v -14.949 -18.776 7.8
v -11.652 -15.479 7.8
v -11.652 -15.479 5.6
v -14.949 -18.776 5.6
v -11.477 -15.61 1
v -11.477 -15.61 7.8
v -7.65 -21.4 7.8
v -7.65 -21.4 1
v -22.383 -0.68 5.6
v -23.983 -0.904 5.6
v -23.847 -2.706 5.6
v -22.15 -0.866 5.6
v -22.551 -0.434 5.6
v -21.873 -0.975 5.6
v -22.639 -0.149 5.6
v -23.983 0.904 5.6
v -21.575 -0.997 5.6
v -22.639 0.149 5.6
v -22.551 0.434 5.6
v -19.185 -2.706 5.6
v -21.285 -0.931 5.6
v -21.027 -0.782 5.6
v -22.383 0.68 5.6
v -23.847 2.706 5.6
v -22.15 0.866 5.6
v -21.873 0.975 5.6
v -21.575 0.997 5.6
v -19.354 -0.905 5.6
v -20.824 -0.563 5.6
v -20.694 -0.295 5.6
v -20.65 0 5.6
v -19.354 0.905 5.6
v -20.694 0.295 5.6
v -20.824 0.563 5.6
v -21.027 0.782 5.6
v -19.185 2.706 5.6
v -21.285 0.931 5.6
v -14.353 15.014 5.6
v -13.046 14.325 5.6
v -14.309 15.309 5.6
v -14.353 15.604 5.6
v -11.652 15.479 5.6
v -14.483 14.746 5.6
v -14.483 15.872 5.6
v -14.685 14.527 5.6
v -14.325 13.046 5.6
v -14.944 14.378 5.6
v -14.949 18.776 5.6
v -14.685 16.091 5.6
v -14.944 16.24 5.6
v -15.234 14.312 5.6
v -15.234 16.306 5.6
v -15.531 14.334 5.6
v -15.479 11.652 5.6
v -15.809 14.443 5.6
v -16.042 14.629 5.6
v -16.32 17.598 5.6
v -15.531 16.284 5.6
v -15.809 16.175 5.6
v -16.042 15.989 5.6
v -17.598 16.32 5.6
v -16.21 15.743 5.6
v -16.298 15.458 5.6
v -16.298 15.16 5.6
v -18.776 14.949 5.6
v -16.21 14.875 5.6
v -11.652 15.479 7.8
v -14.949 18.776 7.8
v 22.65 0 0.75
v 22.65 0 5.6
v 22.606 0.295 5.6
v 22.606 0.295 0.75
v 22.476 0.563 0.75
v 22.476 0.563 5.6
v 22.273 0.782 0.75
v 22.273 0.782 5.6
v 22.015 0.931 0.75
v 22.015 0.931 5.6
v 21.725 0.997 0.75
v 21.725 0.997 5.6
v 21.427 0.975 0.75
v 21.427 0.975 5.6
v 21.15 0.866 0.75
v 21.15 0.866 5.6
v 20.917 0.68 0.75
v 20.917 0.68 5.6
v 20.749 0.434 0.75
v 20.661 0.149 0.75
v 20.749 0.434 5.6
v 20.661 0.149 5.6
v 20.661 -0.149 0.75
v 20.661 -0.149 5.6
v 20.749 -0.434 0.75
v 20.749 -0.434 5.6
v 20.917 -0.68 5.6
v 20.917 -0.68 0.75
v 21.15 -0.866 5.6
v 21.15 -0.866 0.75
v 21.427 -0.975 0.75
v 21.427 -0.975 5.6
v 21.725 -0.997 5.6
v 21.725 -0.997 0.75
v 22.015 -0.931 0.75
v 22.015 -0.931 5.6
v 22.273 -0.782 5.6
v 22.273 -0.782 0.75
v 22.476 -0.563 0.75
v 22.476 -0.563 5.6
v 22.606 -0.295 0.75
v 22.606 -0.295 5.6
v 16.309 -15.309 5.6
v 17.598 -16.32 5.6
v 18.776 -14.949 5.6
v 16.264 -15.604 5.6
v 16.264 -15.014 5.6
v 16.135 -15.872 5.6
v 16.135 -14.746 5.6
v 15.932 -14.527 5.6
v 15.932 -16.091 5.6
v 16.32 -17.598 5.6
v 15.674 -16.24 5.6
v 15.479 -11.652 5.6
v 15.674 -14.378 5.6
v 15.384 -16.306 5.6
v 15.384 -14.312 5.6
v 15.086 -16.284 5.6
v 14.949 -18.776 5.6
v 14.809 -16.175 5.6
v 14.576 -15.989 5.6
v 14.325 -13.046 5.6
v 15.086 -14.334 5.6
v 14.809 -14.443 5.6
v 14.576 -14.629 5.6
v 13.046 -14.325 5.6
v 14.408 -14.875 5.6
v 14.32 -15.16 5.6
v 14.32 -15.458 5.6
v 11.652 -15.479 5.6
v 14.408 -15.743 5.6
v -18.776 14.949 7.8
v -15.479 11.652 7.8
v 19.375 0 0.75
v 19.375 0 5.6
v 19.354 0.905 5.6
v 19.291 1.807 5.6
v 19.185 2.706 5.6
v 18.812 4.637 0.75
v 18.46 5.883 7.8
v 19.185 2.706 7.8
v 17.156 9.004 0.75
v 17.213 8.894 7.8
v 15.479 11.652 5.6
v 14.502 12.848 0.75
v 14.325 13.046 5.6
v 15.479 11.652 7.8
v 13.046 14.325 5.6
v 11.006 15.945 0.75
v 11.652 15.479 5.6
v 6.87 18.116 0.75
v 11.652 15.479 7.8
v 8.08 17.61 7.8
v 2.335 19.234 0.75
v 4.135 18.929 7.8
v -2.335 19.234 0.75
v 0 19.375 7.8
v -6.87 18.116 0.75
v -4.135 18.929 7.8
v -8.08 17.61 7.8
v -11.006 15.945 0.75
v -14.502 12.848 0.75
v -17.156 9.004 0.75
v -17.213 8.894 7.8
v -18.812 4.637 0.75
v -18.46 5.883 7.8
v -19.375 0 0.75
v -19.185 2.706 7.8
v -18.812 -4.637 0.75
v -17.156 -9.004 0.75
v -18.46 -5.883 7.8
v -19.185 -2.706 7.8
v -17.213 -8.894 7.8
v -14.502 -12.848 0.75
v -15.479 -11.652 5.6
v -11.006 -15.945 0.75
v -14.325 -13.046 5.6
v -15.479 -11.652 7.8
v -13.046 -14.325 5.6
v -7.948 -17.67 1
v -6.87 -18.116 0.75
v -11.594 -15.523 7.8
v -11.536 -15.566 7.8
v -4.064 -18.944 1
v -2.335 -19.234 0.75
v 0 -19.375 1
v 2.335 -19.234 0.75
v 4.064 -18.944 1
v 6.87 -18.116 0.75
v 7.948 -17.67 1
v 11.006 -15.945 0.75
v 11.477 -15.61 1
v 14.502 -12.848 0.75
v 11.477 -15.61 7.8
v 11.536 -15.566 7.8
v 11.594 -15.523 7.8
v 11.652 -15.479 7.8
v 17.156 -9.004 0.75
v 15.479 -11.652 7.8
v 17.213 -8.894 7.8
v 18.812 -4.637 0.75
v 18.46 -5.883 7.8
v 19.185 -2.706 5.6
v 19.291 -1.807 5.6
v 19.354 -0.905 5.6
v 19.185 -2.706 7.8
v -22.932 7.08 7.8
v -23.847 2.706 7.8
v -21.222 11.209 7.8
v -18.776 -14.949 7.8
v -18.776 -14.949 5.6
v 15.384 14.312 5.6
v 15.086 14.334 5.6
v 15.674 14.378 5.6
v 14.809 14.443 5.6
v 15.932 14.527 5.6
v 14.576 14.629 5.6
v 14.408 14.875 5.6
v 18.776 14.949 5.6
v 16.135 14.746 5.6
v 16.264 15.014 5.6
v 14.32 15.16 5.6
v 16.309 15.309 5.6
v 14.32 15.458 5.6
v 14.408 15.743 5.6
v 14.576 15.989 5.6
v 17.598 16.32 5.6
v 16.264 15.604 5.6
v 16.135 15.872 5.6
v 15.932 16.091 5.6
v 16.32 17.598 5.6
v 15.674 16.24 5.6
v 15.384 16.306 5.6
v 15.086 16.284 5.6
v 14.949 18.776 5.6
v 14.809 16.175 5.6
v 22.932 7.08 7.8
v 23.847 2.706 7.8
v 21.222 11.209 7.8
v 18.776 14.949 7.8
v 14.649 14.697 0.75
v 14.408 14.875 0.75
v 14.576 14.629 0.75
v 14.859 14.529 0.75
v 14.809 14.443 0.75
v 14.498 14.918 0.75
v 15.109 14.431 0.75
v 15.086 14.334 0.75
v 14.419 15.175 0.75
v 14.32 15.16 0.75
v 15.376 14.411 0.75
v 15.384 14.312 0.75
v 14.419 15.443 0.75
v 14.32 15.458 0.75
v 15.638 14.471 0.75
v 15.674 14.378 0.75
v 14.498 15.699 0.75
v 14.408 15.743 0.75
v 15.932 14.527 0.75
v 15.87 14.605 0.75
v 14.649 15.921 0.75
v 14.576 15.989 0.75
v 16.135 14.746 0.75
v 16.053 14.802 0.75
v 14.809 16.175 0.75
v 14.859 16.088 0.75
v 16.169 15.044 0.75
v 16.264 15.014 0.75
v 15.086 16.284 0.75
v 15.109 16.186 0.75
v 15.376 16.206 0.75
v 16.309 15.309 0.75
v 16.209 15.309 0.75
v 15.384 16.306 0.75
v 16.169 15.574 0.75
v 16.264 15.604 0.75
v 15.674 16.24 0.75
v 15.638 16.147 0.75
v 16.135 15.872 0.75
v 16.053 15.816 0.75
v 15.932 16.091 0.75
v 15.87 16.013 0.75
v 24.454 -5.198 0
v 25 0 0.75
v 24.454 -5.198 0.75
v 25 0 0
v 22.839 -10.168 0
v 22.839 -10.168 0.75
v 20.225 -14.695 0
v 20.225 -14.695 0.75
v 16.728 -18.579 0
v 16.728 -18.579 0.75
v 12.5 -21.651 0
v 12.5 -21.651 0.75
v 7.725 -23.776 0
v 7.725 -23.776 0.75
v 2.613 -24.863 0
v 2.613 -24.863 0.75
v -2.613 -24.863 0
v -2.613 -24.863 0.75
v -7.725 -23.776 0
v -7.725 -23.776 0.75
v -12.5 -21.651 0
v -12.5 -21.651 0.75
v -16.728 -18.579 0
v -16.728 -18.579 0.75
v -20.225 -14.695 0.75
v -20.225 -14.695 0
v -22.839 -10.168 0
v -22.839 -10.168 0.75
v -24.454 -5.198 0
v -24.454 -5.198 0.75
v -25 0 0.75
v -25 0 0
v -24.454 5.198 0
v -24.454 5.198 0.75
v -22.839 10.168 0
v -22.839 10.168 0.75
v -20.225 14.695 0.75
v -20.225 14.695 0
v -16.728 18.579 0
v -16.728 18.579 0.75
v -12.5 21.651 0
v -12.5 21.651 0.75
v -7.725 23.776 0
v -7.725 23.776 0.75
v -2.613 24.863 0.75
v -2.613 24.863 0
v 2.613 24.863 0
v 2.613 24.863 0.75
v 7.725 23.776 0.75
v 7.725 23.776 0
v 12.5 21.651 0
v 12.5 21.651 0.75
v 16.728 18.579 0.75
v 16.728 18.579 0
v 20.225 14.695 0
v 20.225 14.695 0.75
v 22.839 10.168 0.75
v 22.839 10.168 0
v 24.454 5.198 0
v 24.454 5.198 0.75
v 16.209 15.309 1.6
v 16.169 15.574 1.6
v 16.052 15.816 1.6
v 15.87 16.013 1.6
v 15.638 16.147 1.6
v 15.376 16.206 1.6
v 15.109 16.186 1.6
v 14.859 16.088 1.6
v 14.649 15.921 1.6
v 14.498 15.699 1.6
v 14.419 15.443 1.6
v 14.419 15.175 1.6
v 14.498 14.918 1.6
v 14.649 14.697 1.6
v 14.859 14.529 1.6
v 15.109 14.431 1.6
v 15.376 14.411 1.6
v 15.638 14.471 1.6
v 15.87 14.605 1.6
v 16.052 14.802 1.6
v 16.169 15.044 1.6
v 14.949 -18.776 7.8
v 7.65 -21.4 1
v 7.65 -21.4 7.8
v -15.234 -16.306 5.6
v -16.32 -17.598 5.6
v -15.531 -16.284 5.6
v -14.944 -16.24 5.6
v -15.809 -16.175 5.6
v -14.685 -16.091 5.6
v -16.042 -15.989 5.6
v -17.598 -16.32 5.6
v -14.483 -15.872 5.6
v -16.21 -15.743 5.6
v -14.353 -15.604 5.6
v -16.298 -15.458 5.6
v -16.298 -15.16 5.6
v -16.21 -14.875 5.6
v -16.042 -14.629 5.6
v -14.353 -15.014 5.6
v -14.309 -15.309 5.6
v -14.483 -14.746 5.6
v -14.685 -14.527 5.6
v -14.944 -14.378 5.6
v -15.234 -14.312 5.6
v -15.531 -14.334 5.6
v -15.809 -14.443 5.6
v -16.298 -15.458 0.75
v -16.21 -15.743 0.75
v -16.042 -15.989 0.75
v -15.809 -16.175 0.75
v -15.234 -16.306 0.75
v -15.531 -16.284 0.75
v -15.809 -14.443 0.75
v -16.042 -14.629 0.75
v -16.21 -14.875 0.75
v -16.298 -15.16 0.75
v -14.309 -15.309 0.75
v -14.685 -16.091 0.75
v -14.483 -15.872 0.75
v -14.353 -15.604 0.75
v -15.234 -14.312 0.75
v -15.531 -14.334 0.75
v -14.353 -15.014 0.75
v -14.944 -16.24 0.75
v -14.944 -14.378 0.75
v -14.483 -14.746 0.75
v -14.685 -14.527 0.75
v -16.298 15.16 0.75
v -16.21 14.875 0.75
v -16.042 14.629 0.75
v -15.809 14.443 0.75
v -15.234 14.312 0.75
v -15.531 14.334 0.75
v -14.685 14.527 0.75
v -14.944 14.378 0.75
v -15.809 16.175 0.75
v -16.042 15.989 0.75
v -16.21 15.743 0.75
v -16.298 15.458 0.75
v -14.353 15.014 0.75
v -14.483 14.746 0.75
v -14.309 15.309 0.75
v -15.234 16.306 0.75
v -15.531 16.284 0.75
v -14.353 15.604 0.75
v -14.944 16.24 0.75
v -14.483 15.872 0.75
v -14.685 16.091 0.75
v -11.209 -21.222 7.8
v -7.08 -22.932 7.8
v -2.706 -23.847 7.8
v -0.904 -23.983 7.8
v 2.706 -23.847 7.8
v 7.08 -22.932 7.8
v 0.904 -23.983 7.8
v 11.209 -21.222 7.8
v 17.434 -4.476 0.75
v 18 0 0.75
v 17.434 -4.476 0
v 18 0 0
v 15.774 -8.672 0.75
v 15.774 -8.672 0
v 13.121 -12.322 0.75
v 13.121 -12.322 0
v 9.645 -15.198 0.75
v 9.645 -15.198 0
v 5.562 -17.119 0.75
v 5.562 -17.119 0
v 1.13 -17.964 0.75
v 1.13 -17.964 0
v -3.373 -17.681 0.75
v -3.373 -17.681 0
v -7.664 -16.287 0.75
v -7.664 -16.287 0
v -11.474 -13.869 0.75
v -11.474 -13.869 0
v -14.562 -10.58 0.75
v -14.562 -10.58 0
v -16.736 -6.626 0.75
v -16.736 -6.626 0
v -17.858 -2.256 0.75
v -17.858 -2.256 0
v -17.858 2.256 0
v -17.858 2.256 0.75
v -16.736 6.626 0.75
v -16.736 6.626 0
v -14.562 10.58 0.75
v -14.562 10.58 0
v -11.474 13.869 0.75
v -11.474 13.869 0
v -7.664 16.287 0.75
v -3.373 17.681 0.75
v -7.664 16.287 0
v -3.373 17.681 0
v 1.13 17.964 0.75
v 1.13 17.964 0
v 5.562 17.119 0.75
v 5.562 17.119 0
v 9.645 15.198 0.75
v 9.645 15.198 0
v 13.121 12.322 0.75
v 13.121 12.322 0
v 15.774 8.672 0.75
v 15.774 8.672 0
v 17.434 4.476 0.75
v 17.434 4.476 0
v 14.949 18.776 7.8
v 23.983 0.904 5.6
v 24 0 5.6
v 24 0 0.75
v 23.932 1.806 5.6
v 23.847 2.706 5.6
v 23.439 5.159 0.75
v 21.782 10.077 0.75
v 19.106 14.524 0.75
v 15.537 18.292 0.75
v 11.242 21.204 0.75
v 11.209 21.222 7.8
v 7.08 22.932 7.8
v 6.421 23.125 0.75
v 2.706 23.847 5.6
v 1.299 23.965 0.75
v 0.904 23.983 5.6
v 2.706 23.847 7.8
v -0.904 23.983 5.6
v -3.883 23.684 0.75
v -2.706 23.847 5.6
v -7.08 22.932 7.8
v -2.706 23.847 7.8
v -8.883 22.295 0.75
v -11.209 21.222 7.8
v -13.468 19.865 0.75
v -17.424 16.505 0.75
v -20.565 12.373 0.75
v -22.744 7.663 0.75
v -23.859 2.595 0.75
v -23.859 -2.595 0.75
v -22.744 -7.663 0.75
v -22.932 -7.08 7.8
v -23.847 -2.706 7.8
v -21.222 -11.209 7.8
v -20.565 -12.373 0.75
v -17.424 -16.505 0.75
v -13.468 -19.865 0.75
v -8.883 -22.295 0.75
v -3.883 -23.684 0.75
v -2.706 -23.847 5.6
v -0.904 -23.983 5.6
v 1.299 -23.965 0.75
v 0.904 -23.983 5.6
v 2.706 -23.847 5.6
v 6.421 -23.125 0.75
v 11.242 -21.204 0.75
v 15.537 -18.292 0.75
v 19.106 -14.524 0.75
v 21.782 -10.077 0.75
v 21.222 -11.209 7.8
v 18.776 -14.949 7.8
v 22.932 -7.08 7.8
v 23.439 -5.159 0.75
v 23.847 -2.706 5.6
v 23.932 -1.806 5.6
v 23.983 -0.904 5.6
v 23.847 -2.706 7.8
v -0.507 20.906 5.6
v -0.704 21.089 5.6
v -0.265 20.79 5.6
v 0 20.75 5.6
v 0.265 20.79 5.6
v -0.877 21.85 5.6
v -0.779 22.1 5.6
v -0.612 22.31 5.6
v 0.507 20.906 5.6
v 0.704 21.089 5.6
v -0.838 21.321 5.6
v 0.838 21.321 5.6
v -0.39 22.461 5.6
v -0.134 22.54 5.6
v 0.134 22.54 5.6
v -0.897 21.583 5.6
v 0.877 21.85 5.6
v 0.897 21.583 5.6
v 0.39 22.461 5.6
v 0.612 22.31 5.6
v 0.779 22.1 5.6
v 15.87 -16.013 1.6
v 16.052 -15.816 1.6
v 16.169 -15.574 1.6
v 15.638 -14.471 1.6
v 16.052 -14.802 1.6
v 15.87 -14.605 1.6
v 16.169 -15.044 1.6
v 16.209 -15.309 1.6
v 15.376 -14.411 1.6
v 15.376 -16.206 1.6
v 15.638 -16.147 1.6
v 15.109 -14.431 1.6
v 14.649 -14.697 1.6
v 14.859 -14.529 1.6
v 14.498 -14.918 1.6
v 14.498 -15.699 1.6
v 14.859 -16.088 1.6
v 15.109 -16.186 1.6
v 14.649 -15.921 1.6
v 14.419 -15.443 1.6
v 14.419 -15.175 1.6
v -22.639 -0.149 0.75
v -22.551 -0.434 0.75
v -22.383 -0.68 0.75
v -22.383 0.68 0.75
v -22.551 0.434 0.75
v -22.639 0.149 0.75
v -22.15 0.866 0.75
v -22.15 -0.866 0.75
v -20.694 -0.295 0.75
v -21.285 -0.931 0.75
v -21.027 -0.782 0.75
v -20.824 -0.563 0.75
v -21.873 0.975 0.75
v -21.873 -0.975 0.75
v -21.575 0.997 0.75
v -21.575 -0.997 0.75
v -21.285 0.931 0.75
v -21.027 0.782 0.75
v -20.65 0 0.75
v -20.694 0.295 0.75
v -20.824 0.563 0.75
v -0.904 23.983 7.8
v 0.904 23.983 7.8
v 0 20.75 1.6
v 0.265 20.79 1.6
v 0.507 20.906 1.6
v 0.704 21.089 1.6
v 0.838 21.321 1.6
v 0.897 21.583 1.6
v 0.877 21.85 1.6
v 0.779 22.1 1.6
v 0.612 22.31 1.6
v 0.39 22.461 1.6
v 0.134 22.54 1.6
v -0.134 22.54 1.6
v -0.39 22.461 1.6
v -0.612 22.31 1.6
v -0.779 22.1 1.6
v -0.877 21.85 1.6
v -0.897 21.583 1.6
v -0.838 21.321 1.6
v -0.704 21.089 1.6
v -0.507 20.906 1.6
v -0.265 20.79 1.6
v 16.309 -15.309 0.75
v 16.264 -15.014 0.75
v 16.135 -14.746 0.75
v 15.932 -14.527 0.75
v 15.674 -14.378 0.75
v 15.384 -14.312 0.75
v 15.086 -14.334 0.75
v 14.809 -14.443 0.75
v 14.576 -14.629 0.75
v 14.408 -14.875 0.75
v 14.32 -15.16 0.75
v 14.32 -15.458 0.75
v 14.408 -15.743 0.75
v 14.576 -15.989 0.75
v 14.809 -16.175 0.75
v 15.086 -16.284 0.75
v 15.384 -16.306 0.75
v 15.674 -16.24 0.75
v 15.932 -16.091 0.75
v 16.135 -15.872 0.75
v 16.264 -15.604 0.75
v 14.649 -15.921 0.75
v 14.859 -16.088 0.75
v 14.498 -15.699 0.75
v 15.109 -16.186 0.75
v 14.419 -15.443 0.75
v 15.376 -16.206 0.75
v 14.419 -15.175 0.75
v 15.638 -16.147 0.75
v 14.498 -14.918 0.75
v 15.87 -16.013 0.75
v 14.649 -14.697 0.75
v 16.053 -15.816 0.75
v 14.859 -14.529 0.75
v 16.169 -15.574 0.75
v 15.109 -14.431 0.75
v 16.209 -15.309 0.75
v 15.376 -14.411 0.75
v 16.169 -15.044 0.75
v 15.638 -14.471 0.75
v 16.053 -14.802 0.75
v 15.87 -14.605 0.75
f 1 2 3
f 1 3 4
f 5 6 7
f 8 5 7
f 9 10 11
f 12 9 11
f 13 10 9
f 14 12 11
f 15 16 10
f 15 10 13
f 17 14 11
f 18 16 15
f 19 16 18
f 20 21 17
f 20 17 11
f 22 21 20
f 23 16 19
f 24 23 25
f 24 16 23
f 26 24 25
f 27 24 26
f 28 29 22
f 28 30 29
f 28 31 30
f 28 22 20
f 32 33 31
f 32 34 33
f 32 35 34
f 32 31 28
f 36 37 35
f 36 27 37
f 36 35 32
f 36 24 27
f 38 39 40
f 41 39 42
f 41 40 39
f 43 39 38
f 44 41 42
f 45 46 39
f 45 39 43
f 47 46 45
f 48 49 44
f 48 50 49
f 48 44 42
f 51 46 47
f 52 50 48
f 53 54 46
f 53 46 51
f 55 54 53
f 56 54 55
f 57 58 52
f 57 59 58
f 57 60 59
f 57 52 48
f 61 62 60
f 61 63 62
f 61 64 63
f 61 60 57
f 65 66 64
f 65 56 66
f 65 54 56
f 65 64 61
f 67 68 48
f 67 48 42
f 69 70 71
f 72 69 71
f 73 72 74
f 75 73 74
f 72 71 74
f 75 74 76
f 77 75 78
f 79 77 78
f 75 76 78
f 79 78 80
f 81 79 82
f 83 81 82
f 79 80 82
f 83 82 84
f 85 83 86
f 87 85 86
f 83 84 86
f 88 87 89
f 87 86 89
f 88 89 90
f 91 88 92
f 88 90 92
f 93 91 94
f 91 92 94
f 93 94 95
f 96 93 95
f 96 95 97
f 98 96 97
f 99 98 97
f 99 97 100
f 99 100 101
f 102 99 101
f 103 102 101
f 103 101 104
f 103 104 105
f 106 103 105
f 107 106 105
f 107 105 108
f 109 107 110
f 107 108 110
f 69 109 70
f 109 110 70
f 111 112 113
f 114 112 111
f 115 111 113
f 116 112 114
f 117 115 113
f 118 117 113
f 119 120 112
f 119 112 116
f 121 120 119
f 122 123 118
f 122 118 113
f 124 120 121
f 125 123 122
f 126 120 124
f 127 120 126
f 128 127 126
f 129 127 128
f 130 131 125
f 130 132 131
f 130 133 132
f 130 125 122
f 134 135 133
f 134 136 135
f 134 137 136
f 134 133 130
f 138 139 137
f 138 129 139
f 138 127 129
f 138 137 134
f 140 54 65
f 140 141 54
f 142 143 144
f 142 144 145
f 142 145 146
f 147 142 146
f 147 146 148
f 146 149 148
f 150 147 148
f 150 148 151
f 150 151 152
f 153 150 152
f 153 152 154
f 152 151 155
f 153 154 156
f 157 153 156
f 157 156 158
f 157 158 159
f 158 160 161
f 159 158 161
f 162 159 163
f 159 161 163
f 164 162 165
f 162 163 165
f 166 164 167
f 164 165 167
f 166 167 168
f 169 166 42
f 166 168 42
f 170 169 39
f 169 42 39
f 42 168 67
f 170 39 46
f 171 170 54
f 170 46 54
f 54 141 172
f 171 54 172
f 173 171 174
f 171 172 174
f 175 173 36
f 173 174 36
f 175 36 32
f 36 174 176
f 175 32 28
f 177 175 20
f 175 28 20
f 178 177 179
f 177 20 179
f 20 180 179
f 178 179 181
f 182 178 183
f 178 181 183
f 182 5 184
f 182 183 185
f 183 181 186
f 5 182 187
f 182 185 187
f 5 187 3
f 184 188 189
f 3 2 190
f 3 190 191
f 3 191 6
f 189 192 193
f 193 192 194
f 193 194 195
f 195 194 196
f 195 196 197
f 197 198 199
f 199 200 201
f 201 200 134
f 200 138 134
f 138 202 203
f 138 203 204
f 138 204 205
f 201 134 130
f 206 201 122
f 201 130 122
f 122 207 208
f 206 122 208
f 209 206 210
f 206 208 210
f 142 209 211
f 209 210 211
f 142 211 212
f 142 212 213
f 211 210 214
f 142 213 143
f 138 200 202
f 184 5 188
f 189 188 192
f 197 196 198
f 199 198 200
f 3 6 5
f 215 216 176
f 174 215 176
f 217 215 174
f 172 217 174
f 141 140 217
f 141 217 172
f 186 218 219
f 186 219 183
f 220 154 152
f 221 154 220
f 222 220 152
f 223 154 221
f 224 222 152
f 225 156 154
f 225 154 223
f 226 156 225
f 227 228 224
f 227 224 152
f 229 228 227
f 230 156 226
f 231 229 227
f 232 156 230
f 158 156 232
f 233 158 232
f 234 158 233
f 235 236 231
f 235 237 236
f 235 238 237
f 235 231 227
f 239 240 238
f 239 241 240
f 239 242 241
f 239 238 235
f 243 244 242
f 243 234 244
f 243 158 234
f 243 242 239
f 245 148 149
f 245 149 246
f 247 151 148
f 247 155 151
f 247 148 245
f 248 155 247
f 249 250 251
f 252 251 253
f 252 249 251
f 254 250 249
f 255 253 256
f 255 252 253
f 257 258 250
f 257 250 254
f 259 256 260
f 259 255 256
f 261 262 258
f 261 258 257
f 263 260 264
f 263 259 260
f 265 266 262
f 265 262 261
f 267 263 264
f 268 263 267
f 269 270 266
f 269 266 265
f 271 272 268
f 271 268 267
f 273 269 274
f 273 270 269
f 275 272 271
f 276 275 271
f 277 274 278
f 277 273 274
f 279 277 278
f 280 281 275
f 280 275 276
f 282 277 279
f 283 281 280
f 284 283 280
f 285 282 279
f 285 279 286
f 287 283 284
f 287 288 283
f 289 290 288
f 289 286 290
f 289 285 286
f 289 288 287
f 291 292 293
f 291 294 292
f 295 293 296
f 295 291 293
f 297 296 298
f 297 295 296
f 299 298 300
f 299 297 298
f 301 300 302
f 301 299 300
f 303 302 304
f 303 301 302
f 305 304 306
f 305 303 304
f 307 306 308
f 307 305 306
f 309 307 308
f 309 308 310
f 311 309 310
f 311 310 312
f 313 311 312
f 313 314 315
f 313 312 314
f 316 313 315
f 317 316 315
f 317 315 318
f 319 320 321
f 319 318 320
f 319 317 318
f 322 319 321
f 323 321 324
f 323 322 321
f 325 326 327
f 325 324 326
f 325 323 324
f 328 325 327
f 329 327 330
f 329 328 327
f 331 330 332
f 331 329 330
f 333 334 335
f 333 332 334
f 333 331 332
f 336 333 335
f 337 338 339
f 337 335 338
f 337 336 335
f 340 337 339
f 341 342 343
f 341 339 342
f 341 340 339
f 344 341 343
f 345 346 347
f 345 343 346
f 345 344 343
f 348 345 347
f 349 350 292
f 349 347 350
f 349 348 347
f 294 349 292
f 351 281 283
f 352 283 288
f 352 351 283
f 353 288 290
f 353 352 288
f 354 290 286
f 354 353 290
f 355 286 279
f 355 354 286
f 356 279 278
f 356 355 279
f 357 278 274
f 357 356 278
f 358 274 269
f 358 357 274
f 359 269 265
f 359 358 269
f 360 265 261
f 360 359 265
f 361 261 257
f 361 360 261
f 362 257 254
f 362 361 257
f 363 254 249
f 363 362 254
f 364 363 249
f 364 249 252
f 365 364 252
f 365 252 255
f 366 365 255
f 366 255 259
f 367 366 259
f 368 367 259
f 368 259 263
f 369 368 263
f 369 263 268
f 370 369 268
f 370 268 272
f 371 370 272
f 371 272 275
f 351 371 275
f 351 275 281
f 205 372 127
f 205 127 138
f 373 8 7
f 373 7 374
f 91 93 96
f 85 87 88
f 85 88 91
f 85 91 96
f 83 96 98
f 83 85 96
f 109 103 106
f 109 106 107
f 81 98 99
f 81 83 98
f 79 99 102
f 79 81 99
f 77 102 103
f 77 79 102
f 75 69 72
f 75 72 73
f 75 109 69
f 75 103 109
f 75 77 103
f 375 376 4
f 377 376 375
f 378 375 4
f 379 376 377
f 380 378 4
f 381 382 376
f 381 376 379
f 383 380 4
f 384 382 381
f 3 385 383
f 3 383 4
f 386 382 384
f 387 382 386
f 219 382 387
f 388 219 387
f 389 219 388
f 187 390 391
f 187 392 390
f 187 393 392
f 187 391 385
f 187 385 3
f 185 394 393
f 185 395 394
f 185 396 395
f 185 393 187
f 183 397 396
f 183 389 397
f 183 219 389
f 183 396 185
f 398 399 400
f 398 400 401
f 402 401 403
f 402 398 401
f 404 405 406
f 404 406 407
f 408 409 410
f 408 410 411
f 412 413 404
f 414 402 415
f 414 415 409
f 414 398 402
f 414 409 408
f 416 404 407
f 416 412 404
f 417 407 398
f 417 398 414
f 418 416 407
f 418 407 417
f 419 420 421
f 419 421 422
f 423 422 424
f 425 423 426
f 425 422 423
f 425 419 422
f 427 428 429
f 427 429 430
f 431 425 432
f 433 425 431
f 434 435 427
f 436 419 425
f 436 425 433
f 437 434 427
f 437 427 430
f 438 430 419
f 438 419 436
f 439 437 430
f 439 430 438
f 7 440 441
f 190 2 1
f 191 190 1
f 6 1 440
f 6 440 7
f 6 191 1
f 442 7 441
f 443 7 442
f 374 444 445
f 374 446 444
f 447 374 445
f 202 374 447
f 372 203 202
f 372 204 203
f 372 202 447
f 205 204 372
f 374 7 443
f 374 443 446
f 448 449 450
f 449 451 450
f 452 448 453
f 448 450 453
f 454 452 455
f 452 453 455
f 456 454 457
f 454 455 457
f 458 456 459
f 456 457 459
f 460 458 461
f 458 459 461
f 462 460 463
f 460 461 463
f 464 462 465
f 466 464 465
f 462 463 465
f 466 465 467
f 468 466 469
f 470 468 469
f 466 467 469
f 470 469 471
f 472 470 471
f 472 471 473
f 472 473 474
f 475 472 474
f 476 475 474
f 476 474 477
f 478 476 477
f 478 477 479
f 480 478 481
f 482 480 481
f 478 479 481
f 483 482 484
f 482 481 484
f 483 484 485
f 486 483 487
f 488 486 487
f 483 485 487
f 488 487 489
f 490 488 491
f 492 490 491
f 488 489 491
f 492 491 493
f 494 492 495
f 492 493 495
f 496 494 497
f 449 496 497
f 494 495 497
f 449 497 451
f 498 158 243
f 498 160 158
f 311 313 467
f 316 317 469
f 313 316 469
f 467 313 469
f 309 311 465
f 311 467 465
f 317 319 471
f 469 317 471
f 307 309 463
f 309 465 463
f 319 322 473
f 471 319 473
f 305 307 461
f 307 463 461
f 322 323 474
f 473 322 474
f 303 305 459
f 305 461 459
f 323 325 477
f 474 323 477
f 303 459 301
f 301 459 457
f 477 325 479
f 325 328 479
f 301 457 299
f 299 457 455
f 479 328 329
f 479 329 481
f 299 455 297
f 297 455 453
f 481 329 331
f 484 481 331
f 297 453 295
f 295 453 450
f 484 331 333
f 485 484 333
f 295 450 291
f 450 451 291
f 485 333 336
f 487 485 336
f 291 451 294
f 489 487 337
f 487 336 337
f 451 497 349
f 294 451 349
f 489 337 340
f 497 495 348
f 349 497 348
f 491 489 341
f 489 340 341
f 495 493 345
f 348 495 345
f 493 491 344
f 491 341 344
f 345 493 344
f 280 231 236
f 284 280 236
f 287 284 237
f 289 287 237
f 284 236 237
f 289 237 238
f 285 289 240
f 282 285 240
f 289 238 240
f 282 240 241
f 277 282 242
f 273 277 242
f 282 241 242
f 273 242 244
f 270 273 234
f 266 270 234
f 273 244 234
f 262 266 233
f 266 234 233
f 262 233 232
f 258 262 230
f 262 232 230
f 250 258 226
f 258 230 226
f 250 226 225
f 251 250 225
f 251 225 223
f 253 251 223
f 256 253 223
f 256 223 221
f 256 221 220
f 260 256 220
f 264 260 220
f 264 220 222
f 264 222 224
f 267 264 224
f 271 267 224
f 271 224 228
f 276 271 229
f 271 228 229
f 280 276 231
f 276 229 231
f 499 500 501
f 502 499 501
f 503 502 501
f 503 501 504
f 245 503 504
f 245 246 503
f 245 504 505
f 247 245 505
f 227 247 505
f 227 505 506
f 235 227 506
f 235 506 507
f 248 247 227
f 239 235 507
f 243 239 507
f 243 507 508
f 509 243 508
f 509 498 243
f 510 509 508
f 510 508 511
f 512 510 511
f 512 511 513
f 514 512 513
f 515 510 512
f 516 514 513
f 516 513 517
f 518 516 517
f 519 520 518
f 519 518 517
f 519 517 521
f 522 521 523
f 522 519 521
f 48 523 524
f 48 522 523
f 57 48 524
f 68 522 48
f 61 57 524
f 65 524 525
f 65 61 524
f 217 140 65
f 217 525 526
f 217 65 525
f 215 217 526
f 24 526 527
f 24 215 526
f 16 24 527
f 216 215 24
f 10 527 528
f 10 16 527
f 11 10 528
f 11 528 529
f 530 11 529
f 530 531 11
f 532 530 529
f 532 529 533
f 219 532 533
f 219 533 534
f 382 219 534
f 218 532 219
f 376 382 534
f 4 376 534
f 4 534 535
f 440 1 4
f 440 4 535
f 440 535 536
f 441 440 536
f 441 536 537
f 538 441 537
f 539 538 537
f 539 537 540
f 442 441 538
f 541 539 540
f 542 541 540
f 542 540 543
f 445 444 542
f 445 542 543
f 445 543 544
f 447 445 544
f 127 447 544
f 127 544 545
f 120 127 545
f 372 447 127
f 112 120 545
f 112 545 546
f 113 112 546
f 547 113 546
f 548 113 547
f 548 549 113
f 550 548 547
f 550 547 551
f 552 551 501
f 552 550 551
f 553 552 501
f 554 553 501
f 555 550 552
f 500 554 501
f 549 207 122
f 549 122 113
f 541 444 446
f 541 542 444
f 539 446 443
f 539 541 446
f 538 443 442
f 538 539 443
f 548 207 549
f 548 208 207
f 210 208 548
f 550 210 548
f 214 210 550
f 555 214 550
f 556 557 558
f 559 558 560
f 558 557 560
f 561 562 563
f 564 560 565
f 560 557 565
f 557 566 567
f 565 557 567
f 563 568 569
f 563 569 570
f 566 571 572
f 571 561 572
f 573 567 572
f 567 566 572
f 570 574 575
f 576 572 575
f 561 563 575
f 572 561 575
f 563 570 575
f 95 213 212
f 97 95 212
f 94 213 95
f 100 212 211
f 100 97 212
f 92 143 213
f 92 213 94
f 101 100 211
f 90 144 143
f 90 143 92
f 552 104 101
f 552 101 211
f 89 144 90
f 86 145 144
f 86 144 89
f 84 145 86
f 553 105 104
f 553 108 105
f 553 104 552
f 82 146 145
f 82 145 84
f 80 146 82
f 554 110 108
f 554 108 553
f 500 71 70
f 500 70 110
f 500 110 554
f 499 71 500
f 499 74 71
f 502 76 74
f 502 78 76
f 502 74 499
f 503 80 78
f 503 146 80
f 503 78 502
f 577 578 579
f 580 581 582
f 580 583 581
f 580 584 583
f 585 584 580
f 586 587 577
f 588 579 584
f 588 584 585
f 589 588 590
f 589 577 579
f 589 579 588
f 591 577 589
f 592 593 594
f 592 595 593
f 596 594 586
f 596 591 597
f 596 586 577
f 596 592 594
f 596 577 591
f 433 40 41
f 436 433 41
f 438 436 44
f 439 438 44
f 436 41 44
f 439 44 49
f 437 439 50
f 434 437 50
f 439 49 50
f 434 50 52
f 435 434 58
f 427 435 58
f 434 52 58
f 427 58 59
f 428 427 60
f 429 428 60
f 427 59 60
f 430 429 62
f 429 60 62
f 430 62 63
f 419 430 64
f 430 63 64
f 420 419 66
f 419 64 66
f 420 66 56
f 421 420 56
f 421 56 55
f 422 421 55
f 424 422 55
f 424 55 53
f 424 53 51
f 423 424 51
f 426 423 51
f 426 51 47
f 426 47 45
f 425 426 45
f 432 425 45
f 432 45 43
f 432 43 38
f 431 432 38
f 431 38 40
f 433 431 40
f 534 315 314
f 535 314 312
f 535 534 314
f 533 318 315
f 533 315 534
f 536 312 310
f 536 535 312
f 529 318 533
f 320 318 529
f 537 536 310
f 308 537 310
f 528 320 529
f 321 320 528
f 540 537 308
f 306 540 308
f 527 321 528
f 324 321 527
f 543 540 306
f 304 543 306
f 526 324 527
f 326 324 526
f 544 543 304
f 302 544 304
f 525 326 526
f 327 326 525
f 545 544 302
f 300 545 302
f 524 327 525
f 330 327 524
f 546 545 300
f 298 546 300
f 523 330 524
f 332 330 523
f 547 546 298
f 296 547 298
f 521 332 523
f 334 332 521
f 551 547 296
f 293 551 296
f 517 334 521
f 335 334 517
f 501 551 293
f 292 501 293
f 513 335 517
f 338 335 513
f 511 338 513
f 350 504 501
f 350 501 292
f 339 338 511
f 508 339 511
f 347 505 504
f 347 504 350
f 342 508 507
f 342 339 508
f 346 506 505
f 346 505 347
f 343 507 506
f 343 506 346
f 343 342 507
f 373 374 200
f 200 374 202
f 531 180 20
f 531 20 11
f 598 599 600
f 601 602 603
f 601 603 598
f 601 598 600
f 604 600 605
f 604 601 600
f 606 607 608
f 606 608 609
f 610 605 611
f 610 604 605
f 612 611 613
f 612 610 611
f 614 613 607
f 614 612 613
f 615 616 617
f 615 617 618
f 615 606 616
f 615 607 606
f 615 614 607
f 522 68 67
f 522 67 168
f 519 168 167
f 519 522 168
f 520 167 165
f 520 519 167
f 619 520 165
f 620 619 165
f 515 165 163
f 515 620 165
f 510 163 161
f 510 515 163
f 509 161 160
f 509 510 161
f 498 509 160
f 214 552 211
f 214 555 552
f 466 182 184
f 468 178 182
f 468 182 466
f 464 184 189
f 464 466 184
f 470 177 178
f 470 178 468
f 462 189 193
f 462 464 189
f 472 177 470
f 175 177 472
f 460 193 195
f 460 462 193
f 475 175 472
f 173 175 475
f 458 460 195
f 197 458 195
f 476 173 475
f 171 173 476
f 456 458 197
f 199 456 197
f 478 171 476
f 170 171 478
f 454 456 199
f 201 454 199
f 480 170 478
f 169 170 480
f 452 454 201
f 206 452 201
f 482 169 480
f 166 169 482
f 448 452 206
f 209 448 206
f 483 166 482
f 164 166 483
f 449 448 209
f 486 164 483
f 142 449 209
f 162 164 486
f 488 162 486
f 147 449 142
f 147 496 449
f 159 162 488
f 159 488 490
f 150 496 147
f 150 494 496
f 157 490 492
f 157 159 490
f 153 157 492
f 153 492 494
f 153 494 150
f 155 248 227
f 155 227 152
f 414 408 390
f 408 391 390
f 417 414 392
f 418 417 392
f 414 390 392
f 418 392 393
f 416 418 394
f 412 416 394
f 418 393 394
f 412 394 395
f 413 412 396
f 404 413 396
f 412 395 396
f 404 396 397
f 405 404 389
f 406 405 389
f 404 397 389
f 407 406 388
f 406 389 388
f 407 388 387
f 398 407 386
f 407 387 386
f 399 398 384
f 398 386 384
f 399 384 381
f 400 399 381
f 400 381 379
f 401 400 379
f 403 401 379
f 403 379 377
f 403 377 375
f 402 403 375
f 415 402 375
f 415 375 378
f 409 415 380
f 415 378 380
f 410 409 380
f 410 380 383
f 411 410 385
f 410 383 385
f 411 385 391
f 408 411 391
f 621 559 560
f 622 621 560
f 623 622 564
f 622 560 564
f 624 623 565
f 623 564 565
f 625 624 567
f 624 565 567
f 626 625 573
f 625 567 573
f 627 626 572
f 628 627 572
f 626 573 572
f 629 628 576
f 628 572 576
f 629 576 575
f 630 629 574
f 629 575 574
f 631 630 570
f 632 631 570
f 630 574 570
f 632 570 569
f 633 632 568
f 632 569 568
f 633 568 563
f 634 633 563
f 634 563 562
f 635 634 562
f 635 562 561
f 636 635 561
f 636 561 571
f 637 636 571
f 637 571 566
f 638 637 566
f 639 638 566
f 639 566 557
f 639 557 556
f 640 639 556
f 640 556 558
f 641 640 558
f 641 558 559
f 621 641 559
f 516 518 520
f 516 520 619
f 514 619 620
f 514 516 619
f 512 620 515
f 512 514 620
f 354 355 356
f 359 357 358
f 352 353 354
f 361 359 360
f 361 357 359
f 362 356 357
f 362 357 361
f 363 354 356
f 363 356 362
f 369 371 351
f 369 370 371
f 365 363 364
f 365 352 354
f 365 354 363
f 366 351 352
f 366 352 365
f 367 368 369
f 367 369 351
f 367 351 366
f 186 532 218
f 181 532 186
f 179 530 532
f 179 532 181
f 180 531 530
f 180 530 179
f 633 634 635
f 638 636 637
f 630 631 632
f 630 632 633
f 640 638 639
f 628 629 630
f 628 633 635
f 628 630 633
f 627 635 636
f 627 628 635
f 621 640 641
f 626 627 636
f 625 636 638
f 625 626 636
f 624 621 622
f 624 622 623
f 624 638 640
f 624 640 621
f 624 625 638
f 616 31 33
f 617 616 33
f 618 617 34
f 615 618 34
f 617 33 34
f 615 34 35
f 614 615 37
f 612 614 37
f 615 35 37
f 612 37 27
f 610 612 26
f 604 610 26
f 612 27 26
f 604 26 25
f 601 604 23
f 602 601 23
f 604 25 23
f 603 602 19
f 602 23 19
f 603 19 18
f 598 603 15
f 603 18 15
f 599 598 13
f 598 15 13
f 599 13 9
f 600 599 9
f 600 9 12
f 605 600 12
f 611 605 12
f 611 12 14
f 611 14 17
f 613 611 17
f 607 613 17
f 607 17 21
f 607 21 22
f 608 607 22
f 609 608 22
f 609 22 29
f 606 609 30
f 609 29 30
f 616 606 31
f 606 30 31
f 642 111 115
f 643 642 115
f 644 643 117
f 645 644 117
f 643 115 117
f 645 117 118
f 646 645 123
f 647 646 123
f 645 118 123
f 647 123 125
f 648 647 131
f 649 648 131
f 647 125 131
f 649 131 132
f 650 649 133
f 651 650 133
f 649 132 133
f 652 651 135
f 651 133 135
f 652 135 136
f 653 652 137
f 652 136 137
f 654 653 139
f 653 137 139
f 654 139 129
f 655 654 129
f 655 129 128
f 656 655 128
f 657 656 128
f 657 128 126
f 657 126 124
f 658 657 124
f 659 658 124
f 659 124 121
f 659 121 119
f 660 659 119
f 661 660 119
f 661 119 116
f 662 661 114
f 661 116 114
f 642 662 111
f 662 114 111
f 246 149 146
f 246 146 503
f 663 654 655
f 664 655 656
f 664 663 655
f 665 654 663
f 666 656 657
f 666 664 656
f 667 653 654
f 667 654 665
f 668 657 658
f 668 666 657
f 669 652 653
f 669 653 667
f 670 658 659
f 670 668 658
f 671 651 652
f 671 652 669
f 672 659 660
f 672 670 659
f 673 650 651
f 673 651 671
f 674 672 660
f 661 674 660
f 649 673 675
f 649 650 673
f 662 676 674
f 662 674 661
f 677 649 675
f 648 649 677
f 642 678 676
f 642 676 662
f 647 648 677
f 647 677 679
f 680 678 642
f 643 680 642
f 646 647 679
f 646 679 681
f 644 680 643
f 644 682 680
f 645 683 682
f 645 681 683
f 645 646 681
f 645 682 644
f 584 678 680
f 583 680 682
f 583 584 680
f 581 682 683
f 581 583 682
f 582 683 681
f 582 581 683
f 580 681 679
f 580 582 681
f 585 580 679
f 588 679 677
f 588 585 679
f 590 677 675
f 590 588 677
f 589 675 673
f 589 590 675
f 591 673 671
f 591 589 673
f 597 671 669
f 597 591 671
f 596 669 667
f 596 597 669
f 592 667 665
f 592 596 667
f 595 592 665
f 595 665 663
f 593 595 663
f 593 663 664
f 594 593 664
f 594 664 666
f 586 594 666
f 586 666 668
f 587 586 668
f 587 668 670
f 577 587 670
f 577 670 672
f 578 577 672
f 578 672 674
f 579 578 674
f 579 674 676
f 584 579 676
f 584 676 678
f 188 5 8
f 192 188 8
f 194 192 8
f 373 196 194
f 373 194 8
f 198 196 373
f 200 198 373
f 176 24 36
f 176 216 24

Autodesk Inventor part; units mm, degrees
ref_plane "YZ Plane" through (0, 0, 0) normal (1, 0, 0) x (0, 1, 0)
ref_plane "XZ Plane" through (0, 0, 0) normal (0, 1, 0) x (-1, 0, 0)
ref_plane "XY Plane" through (0, 0, 0) normal (0, 0, 1) x (1, 0, 0)
sketch "Skizze1" plane through (0, 0, 0) normal (0, 0, 1) x (1, 0, 0)
  circle A0 centre (0, 0) radius 18
  circle A1 centre (0, 0) radius 25
  dimension "d0" = 36
  dimension "d1" = 50
extrude "Extrusion1" add sketch "Skizze1" along normal blind 35
sketch "Skizze2" plane through (0, 0, 35) normal (0, 0, 1) x (1, 0, 0)
  circle A0 centre (0, 0) radius 19.3
  line L0 (0, -19.3) -> (0, -21.4)
  line L1 (0, -21.4) -> (-7.65, -21.4)
  line L2 (-7.65, -21.4) -> (7.65, -21.4)
  line L3 (7.65, -21.4) -> (7.65, -17.7191)
  line L4 (-7.65, -21.4) -> (-7.65, -17.7191)
  circle A1 centre (0, 0) radius 25 projected
  circle A2 centre (0, 0) radius 18 projected
  circle A3 centre (0, 0) radius 25 projected
  circle A4 centre (0, 0) radius 18 projected
  circle A5 centre (0, 0) radius 19.3
  dimension "d4" = 38.6
  dimension "d5" = 2.1
  dimension "d6" = 7.65
  dimension "d7" = 90
  dimension "d8" = 15.3
extrude "Extrusion2" cut sketch "Skizze2" against normal blind 34 contours A0 | A0 L0 L1 L4 | L3 L2 L0 A0 | A2
fillet "Rundung1" radius 4 2 edges at (-7.65, -17.7191, 18) (7.65, -17.7191, 18)
sketch "Skizze3" plane through (0, 0, 35) normal (0, 0, 1) x (1, 0, 0)
  arc A0 (9.65, -16.7143) -> (7.65, -20.1784) centre (11.65, -20.1784) ccw projected
  line L0 (7.65, -20.1784) -> (7.65, -21.4) projected
  line L1 (7.65, -21.4) -> (-7.65, -21.4) projected
  line L2 (-7.65, -21.4) -> (-7.65, -20.1784) projected
  arc A1 (-7.65, -20.1784) -> (-9.65, -16.7143) centre (-11.65, -20.1784) ccw projected
  arc A2 (9.65, -16.7143) -> (-9.65, -16.7143) centre (0, 0) ccw projected
  circle A3 centre (0, 0) radius 25 projected
extrude "Extrusion3" cut sketch "Skizze3" against normal blind 25
sketch "Skizze4" plane through (0, 0, 10) normal (0, 0, 1) x (1, 0, 0)
  circle A0 centre (0, 0) radius 24
  circle A1 centre (0, 0) radius 25 projected
  arc A2 (9.65, -16.7143) -> (7.65, -20.1784) centre (11.65, -20.1784) ccw projected
  line L0 (7.65, -21.4) -> (7.65, -20.1784) projected
  line L1 (-7.65, -21.4) -> (7.65, -21.4) projected
  line L2 (-7.65, -20.1784) -> (-7.65, -21.4) projected
  arc A3 (-7.65, -20.1784) -> (-9.65, -16.7143) centre (-11.65, -20.1784) ccw projected
  arc A4 (9.65, -16.7143) -> (-9.65, -16.7143) centre (0, 0) ccw projected
  dimension "d14" = 48
extrude "Extrusion4" cut sketch "Skizze4" against normal blind 9.25 contours A1
sketch "Skizze5" plane through (0, 0, 10) normal (0, 0, 1) x (1, 0, 0)
  circle A0 centre (0, 0) radius 24 projected
  arc A1 (9.65, -16.7143) -> (7.65, -20.1784) centre (11.65, -20.1784) ccw projected
  line L0 (7.65, -21.4) -> (7.65, -20.1784) projected
  line L1 (-7.65, -21.4) -> (7.65, -21.4) projected
  line L2 (-7.65, -20.1784) -> (-7.65, -21.4) projected
  arc A2 (-7.65, -20.1784) -> (-9.65, -16.7143) centre (-11.65, -20.1784) ccw projected
  arc A3 (9.65, -16.7143) -> (-9.65, -16.7143) centre (0, 0) ccw projected
extrude "Extrusion5" cut sketch "Skizze5" against normal blind 2.2
sketch "Skizze6" plane through (0, 0, 7.8) normal (0, 0, 1) x (1, 0, 0)
  line L0 (30, -2.706) -> (-30, -2.706)
  line L1 (-30, -2.706) -> (-30, 2.706)
  line L2 (-30, 2.706) -> (30, 2.706)
  line L3 (30, 2.706) -> (30, -2.706)
  line L4 (30, -2.706) -> (-30, 2.706) construction
  line L5 (-30, -2.706) -> (30, 2.706) construction
  point P0 (0, 0)
  dimension "d33" = 60
extrude "Extrusion6" cut sketch "Skizze6" against normal blind 2.2
sketch "Skizze7" plane through (0, 0, 5.6) normal (0, 0, 1) x (1, 0, 0)
  line L0 (-22.5614, -2.035) -> (-22.5614, 2.035) projected
  line L1 (-22.5614, 0) -> (-19.3, 0)
  arc A0 (-19.1094, 2.706) -> (-19.1094, -2.706) centre (0, 0) ccw projected
  line L2 (-19.3, 0) -> (-24, 0)
  circle A1 centre (0, 0) radius 24 projected
  circle A2 centre (-21.65, 0) radius 0.9
  dimension "d34" = 1.8
extrude "Extrusion7" cut sketch "Skizze7" against normal blind 4 contours A2 L1 | L1 A2
mirror "Spiegeln1" about plane through (0, 0, 0) normal (1, 0, 0) of "Extrusion7"
sketch "Skizze8" plane through (0, 0, 7.8) normal (0, 0, 1) x (1, 0, 0)
  point P0 (0, 0)
pattern_circular "Runde Anordnung1" count 8 over 360 about axis through (0, 0, -10) along (0, 0, 1) of "Extrusion7", "Extrusion6"
sketch "Skizze9" plane through (0, -20.9307, 1.6) normal (0, 0, 1) x (1, 0, 0)
  line L0 (-0.8646, -0.4693) -> (0.8646, -0.4693) projected
  line L1 (-2.706, -0.4693) -> (-0.8646, -0.4693) projected
  line L2 (-2.706, 40.0401) -> (-2.706, 44.7777) projected
  line L3 (2.706, 44.7777) -> (2.706, 40.0401) projected
  arc A0 (2.706, 44.7777) -> (-2.706, 44.7777) centre (0, 20.9307) ccw projected
  arc A1 (2.706, 40.0401) -> (-2.706, 40.0401) centre (0, 20.9307) ccw projected
  arc A2 (-2.706, -2.9163) -> (2.706, -2.9163) centre (0, 20.9307) ccw projected
  line L4 (2.706, -0.4693) -> (2.706, -2.9163) projected
  line L5 (-2.706, -2.9163) -> (-2.706, -0.4693) projected
  line L6 (0.8646, -0.4693) -> (2.706, -0.4693) projected
  arc A3 (-0.8646, -0.4693) -> (0.8646, -0.4693) centre (0, -0.7193) ccw projected
  arc A4 (-0.8646, -0.4693) -> (0.8646, -0.4693) centre (0, -0.7193) ccw projected
extrude "Extrusion8" add sketch "Skizze9" along normal blind 4 contours L0 A3
sketch "Skizze10" plane through (-2.706, -21.4, 5.6) normal (0, 0, 1) x (1, 0, 0)
  line L0 (0, 0) -> (5.412, 0) projected
  line L1 (0, 40.5094) -> (0, 45.247) projected
  line L2 (5.412, 45.247) -> (5.412, 40.5094) projected
  arc A0 (5.412, 45.247) -> (0, 45.247) centre (2.706, 21.4) ccw projected
  arc A1 (5.412, 40.5094) -> (0, 40.5094) centre (2.706, 21.4) ccw projected
  arc A2 (0, -2.447) -> (5.412, -2.447) centre (2.706, 21.4) ccw projected
  line L3 (5.412, 0) -> (5.412, -2.447) projected
  line L4 (0, -2.447) -> (0, 0) projected
extrude "Extrusion9" add sketch "Skizze10" along normal up to surface (2.2 mm away)
sketch "Skizze11" plane through (0, 0, 7.8) normal (0, 0, 1) x (-0.3826834, -0.9238795, 0)
  line L0 (15.7149, 14.7896) -> (16.8435, 15.2571) projected
  arc A0 (11.7491, 15.3117) -> (9.8128, 16.6192) centre (0, 0) ccw projected
  line L1 (16.8435, 15.2571) -> (11.7491, 15.3117)
  line L2 (-18.6903, 4.8128) -> (-23.0673, 6.6258) projected
  arc A1 (9.8128, -16.6192) -> (16.6192, -9.8128) centre (0, 0) ccw projected
  line L3 (9.8128, -16.6192) -> (11.6258, -20.9962) projected
  line L4 (6.6258, -23.0673) -> (4.8128, -18.6903) projected
  arc A2 (-4.8128, -18.6903) -> (4.8128, -18.6903) centre (0, 0) ccw projected
  line L5 (-4.8128, -18.6903) -> (-6.6258, -23.0673) projected
  line L6 (4.8128, 18.6903) -> (6.6258, 23.0673) projected
  line L7 (20.9962, -11.6258) -> (16.6192, -9.8128) projected
  line L8 (18.6903, -4.8128) -> (23.0673, -6.6258) projected
  arc A3 (-9.8128, 16.6192) -> (-16.6192, 9.8128) centre (0, 0) ccw projected
  line L9 (-9.8128, 16.6192) -> (-11.6258, 20.9962) projected
  line L10 (-6.6258, 23.0673) -> (-4.8128, 18.6903) projected
  arc A4 (4.8128, 18.6903) -> (-4.8128, 18.6903) centre (0, 0) ccw projected
  line L11 (-11.6258, -20.9962) -> (-9.8128, -16.6192) projected
  line L12 (11.6258, 20.9962) -> (9.8128, 16.6192) projected
  arc A5 (11.7491, 15.3117) -> (9.8128, 16.6192) centre (0, 0) ccw projected
  arc A6 (11.7491, 15.3117) -> (15.7149, 14.7896) centre (14.1841, 18.4851) ccw projected
  line L13 (16.8435, 15.2571) -> (15.7149, 14.7896) projected
  line L14 (22.6986, 1.1217) -> (16.8435, 15.2571) projected
  line L15 (21.5699, 0.6543) -> (22.6986, 1.1217) projected
  arc A7 (21.5699, 0.6543) -> (19.1349, -2.5192) centre (23.1007, -3.0413) ccw projected
  arc A8 (18.6903, -4.8128) -> (19.1349, -2.5192) centre (0, 0) ccw projected
  line L16 (-20.9962, 11.6258) -> (-16.6192, 9.8128) projected
  arc A9 (-6.6258, -23.0673) -> (6.6258, -23.0673) centre (0, 0) ccw projected
  arc A10 (-18.6903, 4.8128) -> (-9.8128, -16.6192) centre (0, 0) ccw projected
  arc A11 (-23.0673, 6.6258) -> (-11.6258, -20.9962) centre (0, 0) ccw projected
  arc A12 (-11.6258, 20.9962) -> (-20.9962, 11.6258) centre (0, 0) ccw projected
  arc A13 (11.6258, -20.9962) -> (20.9962, -11.6258) centre (0, 0) ccw projected
  arc A14 (6.6258, 23.0673) -> (-6.6258, 23.0673) centre (0, 0) ccw projected
  arc A15 (23.0673, -6.6258) -> (11.6258, 20.9962) centre (0, 0) ccw projected
  point P0 (15.7149, 14.7896)
extrude "Extrusion10" cut sketch "Skizze11" against normal up to surface (6.8 mm away) contours A6 L1 L0
mirror "Spiegeln2" about plane through (0, 0, 0) normal (1, 0, 0) of "Extrusion10"
sketch "Skizze12" plane through (0, 0, 7.8) normal (0, 0, 1) x (-0.3826834, -0.9238795, 0)
  point P0 (0, 0)
sketch "Skizze13" plane through (0, 0, 7.8) normal (0, 0, 1) x (1, 0, 0)
  line L0 (-7.65, -21.4) -> (-9.65, -16.7143) projected
  arc A0 (-11.5989, -15.4258) -> (-9.65, -16.7143) centre (0, 0) ccw projected
  line L1 (-11.5989, -15.4258) -> (-14.9489, -18.7758) projected
  arc A1 (-14.9489, -18.7758) -> (14.9489, -18.7758) centre (0, 0) ccw projected
  line L2 (14.9489, -18.7758) -> (11.5989, -15.4258) projected
  arc A2 (9.65, -16.7143) -> (11.5989, -15.4258) centre (0, 0) ccw projected
  line L3 (9.65, -16.7143) -> (7.65, -21.4) projected
  line L4 (-7.65, -21.4) -> (7.65, -21.4) projected
  arc A3 (-11.5989, -15.4258) -> (-9.65, -16.7143) centre (0, 0) ccw projected
  line L5 (7.65, -21.4) -> (-7.65, -21.4) projected
  line L6 (-11.5989, -15.4258) -> (-7.65, -21.4)
extrude "Extrusion11" cut sketch "Skizze13" against normal up to surface (6.8 mm away) contours L6 A0 L0
mirror "Spiegeln3" about plane through (0, 0, 0) normal (1, 0, 0) of "Extrusion11"
sketch "Skizze14" plane through (0, 0, 1) normal (0, 0, 1) x (1, 0, 0)
  point P0 (0, 0)
sketch "Skizze15" plane through (0, 0, 7.8) normal (0, 0, 1) x (1, 0, 0)
  circle A0 centre (0, 0) radius 19.375
  dimension "d37" = 38.75
extrude "Extrusion12" cut sketch "Skizze15" against normal up to surface (7.05 mm away)
sketch "Skizze16" plane through (0, 0, 7.8) normal (0, 0, 1) x (1, 0, 0)
  circle A0 centre (-15.3089, 15.3089) radius 0.9 projected
  circle A1 centre (-15.3089, 15.3089) radius 1
  circle A2 centre (-21.65, 0) radius 0.9 projected
  circle A3 centre (-21.65, 0) radius 1
  circle A4 centre (-15.3089, -15.3089) radius 0.9 projected
  circle A5 centre (-15.3089, -15.3089) radius 1
  circle A6 centre (15.3089, -15.3089) radius 0.9 projected
  circle A7 centre (15.3089, -15.3089) radius 1
  circle A8 centre (21.65, 0) radius 0.9 projected
  circle A9 centre (21.65, 0) radius 1
  circle A10 centre (15.3089, 15.3089) radius 0.9 projected
  circle A11 centre (15.3089, 15.3089) radius 1
  point P0 (0, 0)
  dimension "d40" = 2
  dimension "d41" = 2
  dimension "d42" = 2
  dimension "d43" = 2
  dimension "d44" = 2
  dimension "d45" = 2
extrude "Extrusion13" cut sketch "Skizze16" against normal up to surface (7.05 mm away) contours A0 | A1 | A2 | A3 | A4 | A5 | A7 | A8 | A9 | A11
properties part number "LCDmount_3D-Druck"
